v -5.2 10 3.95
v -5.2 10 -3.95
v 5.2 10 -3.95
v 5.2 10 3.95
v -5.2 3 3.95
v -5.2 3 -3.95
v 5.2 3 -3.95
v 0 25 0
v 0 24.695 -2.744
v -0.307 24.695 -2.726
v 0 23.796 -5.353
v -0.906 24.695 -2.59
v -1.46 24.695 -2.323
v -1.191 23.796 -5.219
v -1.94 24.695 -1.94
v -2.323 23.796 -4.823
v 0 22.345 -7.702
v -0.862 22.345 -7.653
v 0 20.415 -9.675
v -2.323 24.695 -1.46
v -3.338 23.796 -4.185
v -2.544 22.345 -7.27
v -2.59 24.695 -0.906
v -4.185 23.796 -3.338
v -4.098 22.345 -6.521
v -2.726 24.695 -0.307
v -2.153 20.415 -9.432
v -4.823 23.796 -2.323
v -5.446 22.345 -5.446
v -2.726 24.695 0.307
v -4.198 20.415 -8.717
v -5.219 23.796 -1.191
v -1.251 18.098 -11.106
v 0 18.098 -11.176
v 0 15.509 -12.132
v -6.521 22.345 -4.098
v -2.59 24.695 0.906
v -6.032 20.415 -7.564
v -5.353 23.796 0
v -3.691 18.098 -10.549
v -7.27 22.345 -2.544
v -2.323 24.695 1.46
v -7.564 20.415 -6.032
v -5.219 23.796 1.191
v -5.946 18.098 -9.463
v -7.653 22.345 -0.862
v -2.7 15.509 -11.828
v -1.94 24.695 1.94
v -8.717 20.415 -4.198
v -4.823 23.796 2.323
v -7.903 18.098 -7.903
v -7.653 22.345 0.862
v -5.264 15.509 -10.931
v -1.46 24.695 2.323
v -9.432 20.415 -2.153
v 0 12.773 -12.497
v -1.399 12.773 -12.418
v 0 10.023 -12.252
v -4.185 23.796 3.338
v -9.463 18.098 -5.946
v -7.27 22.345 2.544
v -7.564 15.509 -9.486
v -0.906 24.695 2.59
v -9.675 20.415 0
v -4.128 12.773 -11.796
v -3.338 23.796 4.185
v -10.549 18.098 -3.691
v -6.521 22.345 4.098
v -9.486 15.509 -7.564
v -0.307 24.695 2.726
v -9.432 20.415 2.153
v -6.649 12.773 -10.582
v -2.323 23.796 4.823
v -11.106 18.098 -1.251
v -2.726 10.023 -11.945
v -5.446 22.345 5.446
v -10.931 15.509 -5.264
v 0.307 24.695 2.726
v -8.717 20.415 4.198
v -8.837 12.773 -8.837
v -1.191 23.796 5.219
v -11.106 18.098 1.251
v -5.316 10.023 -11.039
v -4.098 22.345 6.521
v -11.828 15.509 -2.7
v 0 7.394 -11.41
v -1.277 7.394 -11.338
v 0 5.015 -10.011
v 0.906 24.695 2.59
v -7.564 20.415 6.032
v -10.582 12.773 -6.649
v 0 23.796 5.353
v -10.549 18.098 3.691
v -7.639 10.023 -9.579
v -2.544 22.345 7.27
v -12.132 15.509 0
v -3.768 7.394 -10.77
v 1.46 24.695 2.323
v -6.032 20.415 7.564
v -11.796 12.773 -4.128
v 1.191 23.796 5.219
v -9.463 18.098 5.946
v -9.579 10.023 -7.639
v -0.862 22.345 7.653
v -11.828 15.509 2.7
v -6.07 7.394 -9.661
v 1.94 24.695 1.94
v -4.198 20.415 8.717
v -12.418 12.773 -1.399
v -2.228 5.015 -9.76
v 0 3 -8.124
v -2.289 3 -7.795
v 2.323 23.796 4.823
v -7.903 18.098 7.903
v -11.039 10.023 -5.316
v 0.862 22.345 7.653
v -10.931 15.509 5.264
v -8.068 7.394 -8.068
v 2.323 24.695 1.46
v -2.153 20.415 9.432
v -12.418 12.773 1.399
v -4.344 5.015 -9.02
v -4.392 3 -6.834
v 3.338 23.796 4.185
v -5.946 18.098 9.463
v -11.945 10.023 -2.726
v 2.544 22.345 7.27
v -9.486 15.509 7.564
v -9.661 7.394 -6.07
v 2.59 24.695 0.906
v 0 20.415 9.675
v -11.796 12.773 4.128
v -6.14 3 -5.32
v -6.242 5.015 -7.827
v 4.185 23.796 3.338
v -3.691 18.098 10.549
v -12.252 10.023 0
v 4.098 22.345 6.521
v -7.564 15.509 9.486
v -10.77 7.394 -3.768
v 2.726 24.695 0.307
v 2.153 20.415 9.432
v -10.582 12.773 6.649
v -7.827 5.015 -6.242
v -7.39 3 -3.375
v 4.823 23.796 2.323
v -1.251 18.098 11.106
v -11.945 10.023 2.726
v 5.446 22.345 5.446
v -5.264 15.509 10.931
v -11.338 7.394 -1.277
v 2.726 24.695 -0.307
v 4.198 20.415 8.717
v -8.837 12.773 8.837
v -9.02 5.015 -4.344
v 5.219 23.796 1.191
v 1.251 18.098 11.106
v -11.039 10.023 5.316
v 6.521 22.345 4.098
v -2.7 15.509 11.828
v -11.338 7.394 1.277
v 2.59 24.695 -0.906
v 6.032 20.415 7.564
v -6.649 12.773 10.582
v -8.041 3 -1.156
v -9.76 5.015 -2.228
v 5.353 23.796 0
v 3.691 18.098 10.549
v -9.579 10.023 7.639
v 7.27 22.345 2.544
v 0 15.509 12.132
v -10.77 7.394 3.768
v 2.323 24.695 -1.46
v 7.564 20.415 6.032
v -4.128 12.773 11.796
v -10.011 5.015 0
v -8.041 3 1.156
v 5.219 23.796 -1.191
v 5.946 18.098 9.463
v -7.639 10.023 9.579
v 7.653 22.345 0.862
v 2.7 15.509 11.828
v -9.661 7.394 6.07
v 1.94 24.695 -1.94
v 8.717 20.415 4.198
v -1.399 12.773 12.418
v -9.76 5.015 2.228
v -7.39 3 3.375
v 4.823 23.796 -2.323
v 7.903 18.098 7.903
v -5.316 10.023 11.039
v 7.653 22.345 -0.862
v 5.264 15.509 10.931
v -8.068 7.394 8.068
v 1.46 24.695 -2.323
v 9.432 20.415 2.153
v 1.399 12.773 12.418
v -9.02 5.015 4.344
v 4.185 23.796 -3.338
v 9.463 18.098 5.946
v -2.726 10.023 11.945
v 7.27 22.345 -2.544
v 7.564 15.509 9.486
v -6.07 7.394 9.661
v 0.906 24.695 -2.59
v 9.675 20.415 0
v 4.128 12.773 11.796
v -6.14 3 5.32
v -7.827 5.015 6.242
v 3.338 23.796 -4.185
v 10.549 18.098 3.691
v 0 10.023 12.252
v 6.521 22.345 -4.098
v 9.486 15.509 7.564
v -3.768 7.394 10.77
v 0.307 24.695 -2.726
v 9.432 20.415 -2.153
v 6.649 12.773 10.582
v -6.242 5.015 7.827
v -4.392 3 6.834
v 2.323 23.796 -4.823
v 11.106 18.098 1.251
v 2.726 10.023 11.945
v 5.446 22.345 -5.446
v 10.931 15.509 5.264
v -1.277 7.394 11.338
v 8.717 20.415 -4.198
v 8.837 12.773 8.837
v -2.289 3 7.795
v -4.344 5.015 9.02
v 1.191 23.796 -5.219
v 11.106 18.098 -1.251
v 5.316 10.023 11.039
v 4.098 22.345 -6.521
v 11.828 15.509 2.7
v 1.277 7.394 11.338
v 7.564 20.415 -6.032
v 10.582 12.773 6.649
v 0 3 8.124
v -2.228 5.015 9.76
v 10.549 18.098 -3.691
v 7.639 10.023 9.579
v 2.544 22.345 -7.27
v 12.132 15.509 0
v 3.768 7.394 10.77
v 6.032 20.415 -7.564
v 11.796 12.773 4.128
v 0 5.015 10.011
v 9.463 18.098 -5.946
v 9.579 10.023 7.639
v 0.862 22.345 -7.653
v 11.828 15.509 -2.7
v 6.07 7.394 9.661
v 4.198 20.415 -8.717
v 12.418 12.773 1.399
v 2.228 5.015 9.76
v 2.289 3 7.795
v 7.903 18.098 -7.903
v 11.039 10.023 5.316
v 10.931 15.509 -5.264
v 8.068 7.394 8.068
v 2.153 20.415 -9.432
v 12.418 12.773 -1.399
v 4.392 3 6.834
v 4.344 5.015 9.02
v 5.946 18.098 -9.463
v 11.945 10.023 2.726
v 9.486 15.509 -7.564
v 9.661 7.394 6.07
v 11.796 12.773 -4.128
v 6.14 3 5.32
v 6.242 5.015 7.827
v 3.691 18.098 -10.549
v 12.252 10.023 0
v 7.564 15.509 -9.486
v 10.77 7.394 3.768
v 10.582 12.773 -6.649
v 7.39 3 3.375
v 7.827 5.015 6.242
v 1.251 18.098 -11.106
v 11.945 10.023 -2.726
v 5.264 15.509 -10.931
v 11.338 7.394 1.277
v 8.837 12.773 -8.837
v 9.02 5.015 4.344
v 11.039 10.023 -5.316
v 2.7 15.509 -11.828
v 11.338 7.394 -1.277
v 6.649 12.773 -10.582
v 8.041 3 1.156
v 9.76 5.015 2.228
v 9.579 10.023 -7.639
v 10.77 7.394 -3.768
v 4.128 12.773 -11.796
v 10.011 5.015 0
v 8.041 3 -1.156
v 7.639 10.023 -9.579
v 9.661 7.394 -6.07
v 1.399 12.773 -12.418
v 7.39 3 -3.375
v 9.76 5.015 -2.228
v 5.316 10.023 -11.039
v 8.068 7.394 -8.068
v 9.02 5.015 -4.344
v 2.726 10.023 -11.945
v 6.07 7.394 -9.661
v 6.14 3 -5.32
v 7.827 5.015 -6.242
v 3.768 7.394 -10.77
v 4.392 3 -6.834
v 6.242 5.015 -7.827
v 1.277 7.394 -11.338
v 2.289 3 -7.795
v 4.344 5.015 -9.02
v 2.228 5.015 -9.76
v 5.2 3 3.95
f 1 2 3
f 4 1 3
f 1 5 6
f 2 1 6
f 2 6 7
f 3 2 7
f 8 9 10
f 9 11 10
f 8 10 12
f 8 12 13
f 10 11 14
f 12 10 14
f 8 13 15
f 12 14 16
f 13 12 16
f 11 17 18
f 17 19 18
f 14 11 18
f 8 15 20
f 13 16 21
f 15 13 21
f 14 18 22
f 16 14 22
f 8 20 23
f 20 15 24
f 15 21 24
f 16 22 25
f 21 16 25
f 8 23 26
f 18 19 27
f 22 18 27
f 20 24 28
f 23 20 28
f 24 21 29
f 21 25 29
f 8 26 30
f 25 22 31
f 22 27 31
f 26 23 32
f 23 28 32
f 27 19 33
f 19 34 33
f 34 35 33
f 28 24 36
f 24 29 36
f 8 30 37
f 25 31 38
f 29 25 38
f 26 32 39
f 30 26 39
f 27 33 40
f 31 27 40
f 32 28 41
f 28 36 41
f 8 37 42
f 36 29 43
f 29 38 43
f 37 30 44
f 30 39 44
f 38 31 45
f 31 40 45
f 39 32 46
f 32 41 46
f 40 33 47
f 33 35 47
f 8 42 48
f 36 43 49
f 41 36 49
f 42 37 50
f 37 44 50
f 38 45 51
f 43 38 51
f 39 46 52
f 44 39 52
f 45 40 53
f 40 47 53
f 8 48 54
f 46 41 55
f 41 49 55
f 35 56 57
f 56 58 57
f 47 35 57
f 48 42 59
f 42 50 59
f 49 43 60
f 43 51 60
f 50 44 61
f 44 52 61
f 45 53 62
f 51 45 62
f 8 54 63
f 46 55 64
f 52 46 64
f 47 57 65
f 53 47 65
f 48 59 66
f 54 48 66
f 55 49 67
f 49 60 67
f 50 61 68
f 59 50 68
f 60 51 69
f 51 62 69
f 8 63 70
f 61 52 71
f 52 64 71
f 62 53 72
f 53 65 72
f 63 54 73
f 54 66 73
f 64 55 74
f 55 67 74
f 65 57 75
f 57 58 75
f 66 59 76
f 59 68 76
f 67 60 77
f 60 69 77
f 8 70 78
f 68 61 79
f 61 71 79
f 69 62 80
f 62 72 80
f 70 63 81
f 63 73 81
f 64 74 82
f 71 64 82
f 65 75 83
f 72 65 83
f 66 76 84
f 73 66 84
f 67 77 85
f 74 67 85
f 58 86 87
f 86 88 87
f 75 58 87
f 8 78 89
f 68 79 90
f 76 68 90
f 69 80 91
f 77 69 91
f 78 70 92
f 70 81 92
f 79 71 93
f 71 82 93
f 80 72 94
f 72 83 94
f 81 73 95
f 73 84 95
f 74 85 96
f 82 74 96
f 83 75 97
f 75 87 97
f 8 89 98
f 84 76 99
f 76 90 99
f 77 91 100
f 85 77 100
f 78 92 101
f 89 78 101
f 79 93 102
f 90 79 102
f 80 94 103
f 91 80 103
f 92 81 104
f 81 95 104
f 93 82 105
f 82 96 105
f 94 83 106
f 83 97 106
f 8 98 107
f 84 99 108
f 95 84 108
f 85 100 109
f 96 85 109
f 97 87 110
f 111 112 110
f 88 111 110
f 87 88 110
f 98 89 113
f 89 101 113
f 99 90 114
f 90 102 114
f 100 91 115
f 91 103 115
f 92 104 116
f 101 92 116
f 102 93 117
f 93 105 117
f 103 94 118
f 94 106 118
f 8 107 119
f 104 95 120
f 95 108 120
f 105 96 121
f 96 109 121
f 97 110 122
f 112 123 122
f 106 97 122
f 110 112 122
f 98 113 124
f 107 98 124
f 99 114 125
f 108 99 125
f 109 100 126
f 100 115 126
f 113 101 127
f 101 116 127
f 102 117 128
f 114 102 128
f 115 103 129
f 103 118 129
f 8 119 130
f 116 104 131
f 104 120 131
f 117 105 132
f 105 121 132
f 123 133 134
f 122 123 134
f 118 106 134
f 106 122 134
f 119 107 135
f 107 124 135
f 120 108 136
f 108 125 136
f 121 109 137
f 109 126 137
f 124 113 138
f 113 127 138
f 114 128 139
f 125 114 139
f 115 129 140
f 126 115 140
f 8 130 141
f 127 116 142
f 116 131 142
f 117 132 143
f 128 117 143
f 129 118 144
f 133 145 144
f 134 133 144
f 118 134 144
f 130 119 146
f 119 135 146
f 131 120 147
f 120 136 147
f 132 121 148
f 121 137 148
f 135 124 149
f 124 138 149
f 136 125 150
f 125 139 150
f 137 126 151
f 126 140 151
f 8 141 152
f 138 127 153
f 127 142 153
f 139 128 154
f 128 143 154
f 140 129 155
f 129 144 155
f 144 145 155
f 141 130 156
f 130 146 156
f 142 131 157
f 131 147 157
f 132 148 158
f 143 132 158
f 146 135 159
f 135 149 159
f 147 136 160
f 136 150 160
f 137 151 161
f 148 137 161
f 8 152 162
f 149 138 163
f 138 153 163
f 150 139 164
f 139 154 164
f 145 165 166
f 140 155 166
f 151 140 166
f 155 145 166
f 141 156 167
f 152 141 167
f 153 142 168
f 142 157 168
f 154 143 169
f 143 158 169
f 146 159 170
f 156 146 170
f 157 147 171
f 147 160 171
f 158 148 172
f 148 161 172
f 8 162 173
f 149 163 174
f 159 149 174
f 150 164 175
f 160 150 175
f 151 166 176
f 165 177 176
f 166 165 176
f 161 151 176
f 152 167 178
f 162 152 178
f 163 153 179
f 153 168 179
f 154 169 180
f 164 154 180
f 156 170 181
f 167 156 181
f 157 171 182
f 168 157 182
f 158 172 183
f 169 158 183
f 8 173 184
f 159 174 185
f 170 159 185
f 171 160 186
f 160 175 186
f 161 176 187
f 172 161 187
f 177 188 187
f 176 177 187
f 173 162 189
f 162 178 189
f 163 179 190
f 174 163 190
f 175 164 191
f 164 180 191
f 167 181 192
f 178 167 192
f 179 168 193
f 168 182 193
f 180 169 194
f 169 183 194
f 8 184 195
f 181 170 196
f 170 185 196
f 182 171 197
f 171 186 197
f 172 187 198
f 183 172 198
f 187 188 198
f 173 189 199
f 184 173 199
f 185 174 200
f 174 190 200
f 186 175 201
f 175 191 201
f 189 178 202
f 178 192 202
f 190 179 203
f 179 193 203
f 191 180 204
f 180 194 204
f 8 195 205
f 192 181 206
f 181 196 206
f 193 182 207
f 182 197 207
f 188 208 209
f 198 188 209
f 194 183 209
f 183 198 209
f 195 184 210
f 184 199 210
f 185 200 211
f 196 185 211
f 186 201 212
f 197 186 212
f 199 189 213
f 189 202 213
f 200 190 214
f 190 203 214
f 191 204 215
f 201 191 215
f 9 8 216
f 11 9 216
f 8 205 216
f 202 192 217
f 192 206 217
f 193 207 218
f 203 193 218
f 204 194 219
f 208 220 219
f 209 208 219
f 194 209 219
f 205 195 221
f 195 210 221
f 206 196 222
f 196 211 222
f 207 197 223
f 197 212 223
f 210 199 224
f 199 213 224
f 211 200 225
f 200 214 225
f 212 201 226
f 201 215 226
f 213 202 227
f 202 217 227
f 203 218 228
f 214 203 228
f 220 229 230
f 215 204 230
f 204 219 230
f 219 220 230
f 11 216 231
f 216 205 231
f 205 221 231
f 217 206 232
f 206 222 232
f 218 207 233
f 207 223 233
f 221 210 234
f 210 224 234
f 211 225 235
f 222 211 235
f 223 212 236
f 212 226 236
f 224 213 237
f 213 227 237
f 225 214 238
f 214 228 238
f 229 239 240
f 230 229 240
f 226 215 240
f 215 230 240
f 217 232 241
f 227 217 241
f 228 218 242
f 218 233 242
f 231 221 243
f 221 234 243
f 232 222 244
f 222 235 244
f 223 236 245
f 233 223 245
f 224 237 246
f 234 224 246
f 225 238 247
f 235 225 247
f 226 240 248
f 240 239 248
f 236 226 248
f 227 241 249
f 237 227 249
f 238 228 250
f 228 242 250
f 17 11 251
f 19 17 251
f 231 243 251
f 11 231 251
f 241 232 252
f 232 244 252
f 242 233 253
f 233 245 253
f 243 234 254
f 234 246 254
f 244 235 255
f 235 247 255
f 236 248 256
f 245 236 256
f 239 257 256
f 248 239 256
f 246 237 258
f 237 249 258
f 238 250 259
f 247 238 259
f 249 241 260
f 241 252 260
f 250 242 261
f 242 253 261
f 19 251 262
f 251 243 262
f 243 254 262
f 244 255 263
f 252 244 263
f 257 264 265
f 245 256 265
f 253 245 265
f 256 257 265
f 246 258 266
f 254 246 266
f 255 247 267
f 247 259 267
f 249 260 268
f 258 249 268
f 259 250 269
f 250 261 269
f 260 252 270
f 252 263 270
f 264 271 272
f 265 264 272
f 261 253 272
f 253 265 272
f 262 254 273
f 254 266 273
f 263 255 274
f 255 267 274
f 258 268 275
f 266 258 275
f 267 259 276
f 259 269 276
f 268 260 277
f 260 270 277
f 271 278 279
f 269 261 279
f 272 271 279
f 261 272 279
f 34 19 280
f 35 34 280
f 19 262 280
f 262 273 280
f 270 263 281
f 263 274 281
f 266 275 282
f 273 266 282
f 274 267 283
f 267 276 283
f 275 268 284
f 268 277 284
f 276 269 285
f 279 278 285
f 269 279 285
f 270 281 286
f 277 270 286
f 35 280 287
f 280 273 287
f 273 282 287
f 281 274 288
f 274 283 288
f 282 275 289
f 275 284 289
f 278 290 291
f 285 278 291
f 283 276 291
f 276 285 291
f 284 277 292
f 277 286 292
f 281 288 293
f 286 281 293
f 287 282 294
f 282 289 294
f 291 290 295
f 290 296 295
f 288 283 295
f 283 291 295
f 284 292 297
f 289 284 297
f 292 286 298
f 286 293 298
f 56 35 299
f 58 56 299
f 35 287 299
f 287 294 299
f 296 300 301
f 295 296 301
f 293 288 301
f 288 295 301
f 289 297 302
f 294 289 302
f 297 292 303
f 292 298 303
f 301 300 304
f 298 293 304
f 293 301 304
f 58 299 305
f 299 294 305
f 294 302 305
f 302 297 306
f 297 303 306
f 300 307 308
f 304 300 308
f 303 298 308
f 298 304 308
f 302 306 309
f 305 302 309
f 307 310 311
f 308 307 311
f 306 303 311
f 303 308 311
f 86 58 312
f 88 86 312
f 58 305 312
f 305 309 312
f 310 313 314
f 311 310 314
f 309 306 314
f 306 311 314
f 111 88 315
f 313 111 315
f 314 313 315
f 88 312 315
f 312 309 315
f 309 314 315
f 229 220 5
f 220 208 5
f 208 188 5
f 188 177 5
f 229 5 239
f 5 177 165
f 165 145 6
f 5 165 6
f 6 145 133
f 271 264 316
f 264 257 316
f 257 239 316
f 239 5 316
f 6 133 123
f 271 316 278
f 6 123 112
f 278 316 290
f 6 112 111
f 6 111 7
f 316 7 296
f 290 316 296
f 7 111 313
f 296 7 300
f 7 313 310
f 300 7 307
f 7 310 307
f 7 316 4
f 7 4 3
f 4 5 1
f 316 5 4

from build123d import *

# Parameters (mm, degrees)
ESQUISSE3_W             = 10.4
ESQUISSE3_H             = 7.9
ESQUISSE3_W_2           = 10
ESQUISSE3_H_2           = 7.5
ENL_V_MAT_EXTRU_1_DEPTH = 10
ESQUISSE5_W             = 20
ESQUISSE5_H             = 20
ENL_V_MAT_EXTRU_2_DEPTH = 3


with BuildPart() as part:
    # Esquisse2 → Révolution1 (revolve)
    with BuildSketch(Plane(origin=(0, 0, 0), x_dir=(0, 0, -1), z_dir=(1, 0, 0))):
        with BuildLine():
            Line((0, 0), (0, 25))
            ThreePointArc((0, 25), (12.5, 12.5), (0, 0))
        make_face()
    revolve(axis=Axis((0, 0, 0), (0, 1, 0)))

    # Esquisse3 → Enlèv. mat.-Extru.1 (cut)
    # profile 1 of 2: a face of its own
    with BuildSketch(Plane(origin=(0, 0, 0), x_dir=(1, 0, 0), z_dir=(0, 1, 0))):
        Rectangle(ESQUISSE3_W, ESQUISSE3_H)
        Rectangle(ESQUISSE3_W_2, ESQUISSE3_H_2, mode=Mode.SUBTRACT)
    # profile 2 of 2: a face of its own
    with BuildSketch(Plane(origin=(0, 0, 0), x_dir=(1, 0, 0), z_dir=(0, 1, 0))):
        Rectangle(ESQUISSE3_W_2, ESQUISSE3_H_2)
    extrude(amount=ENL_V_MAT_EXTRU_1_DEPTH, mode=Mode.SUBTRACT)

    # Esquisse5 → Enlèv. mat.-Extru.2 (cut)
    with BuildSketch(Plane(origin=(0, 0, 0), x_dir=(1, 0, 0), z_dir=(0, 1, 0))):
        Rectangle(ESQUISSE5_W, ESQUISSE5_H)
    extrude(amount=ENL_V_MAT_EXTRU_2_DEPTH, mode=Mode.SUBTRACT)


solid = part.part
